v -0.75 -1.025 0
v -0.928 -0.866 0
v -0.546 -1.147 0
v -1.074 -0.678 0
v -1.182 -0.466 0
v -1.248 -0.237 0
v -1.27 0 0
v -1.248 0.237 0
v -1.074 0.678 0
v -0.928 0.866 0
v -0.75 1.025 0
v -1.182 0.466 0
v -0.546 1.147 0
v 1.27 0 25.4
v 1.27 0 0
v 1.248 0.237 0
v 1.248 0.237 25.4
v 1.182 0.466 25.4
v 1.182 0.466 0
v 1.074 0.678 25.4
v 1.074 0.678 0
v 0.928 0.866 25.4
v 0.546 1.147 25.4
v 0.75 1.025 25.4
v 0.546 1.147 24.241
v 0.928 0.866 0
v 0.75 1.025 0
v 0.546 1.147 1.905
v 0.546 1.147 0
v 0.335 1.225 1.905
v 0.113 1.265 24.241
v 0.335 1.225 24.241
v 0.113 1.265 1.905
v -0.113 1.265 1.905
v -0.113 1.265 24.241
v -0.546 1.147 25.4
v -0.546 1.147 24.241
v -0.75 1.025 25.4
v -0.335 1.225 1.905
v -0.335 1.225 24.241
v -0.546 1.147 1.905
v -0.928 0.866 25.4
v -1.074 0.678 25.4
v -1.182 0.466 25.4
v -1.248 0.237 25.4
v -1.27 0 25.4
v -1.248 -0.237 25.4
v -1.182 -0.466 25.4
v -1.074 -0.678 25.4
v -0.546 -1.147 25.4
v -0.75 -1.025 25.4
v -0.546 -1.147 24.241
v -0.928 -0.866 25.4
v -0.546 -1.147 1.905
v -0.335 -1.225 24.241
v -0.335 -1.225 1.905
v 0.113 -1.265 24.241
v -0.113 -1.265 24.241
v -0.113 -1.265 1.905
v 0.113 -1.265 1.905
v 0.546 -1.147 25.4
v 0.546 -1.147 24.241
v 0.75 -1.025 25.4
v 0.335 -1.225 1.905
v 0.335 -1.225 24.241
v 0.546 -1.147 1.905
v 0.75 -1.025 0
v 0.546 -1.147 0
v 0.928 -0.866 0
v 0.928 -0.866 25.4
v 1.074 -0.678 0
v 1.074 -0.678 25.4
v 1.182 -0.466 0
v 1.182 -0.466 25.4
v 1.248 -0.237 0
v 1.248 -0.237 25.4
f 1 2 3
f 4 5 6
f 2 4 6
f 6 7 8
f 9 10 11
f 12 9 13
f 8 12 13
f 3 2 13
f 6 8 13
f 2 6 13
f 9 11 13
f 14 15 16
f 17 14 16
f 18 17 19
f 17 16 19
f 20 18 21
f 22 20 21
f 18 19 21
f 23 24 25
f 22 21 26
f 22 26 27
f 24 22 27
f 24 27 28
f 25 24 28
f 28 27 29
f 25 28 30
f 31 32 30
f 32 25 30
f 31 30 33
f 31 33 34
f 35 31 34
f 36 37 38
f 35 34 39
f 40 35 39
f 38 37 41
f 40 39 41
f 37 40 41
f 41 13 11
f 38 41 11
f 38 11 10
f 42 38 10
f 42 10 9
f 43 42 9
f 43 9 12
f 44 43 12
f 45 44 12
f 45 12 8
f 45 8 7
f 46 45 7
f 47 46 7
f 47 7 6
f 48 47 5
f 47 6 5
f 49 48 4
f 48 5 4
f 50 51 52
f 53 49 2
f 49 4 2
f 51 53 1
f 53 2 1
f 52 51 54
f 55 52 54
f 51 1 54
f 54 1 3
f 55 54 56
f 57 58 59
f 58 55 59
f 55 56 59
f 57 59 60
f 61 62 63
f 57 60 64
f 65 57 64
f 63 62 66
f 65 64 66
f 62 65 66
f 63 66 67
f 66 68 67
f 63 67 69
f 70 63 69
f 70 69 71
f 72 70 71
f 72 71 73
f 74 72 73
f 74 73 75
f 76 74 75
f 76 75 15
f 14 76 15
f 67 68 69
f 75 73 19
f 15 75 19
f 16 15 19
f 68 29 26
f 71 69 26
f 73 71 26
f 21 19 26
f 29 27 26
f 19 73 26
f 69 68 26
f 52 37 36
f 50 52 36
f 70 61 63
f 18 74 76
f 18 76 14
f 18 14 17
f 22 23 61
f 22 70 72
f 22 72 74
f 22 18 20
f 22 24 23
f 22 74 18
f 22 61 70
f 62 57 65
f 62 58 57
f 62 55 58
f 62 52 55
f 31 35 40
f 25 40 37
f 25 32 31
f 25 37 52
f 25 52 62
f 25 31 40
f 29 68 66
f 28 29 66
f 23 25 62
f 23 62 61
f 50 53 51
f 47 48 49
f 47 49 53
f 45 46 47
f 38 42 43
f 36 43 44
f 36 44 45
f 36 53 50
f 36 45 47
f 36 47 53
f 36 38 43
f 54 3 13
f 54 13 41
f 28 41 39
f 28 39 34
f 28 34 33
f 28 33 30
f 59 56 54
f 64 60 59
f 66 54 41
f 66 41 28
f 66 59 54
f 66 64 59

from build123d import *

# Parameters (mm, degrees)
F0_R     = 1.27
F1_DEPTH = 25.4
F2_W     = 1.0922
F2_H     = 3.81
F3_DEPTH = 9.398
F4_DEPTH = 25.4
F5_W     = 1.0922
F5_H     = 3.81
F6_DEPTH = 25.4
F7_DEPTH = 25.4
F8_DEPTH = 25.4


with BuildPart() as f1:
    # F0 (on Top) → F1 (new body)
    with BuildSketch(Plane.XY):
        Circle(F0_R)
    extrude(amount=F1_DEPTH)

    # F2 (on Front) → F3 (cut)
    with BuildSketch(Plane.XZ):
        with Locations((0, 26.14588)):
            Rectangle(F2_W, F2_H)
    extrude(amount=F3_DEPTH, mode=Mode.SUBTRACT)

    # F2 (on Front) → F4 (cut)
    with BuildSketch(Plane.XZ):
        with Locations((0, 26.14588)):
            Rectangle(F2_W, F2_H)
    extrude(amount=-F4_DEPTH, mode=Mode.SUBTRACT)

    # F5 (on Front) → F6 (cut)
    with BuildSketch(Plane.XZ):
        Rectangle(F5_W, F5_H)
    extrude(amount=-F6_DEPTH, mode=Mode.SUBTRACT)

    # F5 (on Front) → F7 (cut)
    with BuildSketch(Plane.XZ):
        Rectangle(F5_W, F5_H)
    extrude(amount=F7_DEPTH, mode=Mode.SUBTRACT)

    # F2 (on Front) → F8 (cut)
    with BuildSketch(Plane.XZ):
        with Locations((0, 26.14588)):
            Rectangle(F2_W, F2_H)
    extrude(amount=-F8_DEPTH, mode=Mode.SUBTRACT)


solid = f1.part
